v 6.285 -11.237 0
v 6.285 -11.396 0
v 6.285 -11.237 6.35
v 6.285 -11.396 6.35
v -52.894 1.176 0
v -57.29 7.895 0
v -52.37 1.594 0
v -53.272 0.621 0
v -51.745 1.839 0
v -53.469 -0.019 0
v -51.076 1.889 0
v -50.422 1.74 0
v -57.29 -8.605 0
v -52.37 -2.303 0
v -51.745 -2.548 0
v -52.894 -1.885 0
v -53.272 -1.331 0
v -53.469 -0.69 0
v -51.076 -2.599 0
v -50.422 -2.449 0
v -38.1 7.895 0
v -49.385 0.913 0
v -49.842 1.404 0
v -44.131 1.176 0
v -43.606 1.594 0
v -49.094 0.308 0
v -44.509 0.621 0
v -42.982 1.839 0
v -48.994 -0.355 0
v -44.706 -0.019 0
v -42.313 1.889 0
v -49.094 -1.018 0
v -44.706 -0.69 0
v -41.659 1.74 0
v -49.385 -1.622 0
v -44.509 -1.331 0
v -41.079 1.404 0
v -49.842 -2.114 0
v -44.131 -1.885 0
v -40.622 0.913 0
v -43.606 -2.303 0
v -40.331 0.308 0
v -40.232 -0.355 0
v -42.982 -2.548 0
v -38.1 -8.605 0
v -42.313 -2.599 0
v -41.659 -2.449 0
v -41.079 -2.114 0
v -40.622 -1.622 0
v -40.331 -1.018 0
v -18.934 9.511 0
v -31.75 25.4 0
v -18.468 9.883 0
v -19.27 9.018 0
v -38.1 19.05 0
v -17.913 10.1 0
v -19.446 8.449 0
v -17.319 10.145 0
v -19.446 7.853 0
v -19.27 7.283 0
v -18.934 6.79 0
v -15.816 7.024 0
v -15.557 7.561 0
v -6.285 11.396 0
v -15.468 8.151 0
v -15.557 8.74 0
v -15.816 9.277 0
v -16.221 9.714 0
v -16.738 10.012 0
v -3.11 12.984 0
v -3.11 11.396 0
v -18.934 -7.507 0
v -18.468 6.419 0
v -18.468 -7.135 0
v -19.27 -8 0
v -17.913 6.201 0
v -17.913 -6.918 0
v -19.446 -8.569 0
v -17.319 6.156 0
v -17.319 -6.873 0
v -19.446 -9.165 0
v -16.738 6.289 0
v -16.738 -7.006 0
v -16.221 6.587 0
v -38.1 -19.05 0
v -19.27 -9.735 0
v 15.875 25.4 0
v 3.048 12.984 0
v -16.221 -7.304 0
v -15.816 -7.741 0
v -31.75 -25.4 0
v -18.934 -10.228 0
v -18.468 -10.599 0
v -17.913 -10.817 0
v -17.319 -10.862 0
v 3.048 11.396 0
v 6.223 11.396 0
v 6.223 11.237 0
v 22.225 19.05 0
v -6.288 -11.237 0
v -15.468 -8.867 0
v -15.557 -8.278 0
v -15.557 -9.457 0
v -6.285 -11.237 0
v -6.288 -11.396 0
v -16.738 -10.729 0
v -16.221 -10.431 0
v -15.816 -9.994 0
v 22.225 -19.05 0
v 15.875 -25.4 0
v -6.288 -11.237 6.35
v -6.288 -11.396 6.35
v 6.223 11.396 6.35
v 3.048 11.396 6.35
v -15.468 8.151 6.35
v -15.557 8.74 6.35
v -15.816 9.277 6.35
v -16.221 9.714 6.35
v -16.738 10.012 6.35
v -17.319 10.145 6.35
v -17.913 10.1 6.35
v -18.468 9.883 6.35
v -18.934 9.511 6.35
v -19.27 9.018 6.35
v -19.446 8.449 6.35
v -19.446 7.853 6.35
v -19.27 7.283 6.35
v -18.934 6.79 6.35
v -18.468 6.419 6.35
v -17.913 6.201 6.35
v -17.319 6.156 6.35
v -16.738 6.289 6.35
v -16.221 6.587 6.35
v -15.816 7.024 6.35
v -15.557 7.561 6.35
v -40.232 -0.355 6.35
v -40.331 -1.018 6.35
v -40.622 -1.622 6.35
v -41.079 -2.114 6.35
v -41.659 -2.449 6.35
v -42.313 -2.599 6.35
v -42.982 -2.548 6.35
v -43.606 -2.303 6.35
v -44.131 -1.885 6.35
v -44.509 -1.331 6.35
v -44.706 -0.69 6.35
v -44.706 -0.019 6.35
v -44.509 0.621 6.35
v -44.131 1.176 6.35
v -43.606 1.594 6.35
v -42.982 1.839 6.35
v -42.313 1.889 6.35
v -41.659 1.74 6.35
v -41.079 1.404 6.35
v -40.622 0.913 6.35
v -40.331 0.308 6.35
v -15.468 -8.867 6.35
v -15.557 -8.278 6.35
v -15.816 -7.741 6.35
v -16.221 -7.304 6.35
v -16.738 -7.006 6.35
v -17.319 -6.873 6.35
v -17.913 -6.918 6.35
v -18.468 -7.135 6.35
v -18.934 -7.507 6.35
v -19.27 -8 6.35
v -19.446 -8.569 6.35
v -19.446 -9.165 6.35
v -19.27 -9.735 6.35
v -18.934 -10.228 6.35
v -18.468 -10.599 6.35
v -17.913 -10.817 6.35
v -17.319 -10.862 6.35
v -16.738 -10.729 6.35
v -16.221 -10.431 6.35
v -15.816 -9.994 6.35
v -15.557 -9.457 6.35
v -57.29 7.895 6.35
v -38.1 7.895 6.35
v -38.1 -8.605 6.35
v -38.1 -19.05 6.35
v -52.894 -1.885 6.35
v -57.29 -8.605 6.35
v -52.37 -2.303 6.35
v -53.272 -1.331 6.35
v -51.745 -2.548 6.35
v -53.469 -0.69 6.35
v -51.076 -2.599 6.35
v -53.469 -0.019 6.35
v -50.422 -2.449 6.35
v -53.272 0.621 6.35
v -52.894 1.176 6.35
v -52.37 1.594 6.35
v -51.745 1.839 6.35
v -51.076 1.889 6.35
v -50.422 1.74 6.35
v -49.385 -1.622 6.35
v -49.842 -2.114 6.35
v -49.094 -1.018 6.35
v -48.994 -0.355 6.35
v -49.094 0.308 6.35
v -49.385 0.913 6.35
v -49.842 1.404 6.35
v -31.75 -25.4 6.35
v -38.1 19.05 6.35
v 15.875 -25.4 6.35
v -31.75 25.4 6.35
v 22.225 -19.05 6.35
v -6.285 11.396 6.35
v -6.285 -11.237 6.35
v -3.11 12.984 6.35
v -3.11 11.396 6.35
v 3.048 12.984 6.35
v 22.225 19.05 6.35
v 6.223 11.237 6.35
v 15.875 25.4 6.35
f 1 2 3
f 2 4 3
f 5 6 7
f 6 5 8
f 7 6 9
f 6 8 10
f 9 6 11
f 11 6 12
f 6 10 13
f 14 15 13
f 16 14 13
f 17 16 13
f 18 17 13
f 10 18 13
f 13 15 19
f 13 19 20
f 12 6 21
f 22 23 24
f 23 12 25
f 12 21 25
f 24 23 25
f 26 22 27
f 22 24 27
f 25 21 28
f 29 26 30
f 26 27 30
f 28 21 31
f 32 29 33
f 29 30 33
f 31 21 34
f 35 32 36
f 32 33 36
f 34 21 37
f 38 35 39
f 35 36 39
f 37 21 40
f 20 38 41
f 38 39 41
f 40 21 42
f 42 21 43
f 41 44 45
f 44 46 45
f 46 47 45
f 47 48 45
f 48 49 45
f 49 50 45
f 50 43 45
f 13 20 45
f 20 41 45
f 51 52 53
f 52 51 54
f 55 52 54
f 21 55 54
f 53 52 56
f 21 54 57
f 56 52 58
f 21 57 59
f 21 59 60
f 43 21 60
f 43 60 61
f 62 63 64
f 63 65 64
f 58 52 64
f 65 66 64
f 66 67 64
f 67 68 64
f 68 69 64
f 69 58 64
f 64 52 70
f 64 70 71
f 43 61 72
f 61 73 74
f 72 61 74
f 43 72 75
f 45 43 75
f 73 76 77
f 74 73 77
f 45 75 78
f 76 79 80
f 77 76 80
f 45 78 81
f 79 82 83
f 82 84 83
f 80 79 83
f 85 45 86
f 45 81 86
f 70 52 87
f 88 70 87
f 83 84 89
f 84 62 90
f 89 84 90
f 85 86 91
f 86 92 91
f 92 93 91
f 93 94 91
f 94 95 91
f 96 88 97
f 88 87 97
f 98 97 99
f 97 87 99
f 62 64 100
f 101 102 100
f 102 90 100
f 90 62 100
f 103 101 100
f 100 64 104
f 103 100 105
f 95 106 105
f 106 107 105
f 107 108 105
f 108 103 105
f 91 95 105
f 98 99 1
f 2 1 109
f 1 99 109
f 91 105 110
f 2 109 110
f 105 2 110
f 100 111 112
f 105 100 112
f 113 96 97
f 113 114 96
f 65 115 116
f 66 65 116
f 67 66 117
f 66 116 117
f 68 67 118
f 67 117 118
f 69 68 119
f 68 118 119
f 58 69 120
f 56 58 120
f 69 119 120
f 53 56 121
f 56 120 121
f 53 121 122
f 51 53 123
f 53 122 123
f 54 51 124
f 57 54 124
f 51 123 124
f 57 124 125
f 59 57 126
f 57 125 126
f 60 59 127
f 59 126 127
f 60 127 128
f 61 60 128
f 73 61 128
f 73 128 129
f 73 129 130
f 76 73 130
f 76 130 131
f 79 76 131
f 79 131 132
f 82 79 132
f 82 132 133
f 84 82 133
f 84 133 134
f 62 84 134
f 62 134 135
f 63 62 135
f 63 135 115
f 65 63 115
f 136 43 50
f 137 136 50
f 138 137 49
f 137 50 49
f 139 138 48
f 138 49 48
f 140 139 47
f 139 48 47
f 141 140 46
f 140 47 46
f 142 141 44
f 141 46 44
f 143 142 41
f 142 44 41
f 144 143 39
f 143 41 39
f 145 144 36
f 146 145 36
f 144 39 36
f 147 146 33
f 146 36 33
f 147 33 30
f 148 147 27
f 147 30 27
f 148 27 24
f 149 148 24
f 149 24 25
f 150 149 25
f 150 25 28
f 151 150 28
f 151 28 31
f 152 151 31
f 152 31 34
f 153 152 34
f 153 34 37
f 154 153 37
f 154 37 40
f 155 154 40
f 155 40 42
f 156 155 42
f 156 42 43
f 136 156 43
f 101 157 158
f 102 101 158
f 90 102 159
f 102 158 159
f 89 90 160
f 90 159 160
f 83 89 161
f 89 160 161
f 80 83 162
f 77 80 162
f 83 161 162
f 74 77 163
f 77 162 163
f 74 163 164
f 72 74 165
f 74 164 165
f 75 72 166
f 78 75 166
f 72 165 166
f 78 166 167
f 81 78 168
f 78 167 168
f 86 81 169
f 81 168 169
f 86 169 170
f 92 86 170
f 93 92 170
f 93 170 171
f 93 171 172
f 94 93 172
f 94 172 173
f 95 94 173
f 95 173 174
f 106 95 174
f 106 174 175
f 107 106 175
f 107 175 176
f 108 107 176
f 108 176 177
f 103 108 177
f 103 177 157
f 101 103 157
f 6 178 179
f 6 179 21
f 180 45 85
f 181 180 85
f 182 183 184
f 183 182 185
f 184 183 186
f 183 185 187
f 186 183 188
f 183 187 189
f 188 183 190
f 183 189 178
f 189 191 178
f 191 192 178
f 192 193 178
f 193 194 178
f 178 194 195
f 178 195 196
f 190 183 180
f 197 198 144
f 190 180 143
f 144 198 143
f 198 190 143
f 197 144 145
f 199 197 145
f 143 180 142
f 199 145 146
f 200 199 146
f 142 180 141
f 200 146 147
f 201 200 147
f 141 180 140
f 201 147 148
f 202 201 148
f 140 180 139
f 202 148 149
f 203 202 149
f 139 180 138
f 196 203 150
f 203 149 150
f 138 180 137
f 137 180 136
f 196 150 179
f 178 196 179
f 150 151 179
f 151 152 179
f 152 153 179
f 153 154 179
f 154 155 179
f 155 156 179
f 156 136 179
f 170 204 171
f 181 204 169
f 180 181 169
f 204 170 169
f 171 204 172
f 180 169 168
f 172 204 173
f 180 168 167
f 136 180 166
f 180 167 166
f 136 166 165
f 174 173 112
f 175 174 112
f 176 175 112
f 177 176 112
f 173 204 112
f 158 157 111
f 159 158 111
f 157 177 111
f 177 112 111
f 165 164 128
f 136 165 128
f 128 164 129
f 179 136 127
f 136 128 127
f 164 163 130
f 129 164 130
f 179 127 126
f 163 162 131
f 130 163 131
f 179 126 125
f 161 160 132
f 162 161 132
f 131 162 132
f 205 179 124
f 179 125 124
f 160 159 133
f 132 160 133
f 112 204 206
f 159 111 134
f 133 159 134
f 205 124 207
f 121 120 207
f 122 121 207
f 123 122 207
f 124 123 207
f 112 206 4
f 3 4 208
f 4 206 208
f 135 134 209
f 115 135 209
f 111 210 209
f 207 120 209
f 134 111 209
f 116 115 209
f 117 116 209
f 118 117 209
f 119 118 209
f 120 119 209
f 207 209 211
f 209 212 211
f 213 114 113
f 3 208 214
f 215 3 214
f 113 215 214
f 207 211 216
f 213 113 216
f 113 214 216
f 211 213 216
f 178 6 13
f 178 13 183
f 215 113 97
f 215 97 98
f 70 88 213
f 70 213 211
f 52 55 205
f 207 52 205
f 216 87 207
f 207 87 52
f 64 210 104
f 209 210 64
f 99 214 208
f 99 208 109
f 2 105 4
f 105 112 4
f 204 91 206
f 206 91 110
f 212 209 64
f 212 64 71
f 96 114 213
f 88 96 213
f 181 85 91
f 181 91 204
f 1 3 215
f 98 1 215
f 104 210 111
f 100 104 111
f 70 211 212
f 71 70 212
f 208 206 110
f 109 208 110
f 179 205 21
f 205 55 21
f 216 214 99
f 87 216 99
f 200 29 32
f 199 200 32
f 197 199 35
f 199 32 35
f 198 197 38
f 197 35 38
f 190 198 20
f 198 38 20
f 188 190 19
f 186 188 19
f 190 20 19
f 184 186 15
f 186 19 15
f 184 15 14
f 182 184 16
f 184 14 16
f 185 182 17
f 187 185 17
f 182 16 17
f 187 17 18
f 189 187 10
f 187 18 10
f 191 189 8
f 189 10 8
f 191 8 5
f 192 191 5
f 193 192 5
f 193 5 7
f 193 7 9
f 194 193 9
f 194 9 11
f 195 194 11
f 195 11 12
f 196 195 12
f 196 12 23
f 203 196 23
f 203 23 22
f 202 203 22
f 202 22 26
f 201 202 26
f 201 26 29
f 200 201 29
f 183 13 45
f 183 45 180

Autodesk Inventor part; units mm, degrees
ref_plane "YZ Plane" through (0, 0, 0) normal (1, 0, 0) x (0, 1, 0)
ref_plane "XZ Plane" through (0, 0, 0) normal (0, 1, 0) x (-1, 0, 0)
ref_plane "XY Plane" through (0, 0, 0) normal (0, 0, 1) x (1, 0, 0)
sketch "Sketch1" plane through (0, 0, 0) normal (0, 0, 1) x (1, 0, 0)
  line L0 (-38.1, -25.4) -> (38.1, -25.4)
  line L1 (38.1, -25.4) -> (38.1, 25.4)
  line L2 (38.1, 25.4) -> (-38.1, 25.4)
  line L3 (-38.1, 25.4) -> (-38.1, -25.4)
  line L4 (-38.1, -25.4) -> (38.1, 25.4) construction
  line L5 (38.1, -25.4) -> (-38.1, 25.4) construction
  point P0 (0, 0)
  dimension "d0" = 76.2
  dimension "d1" = 50.8
extrude "Extrusion1" add sketch "Sketch1" along normal blind 6.35
sketch "Sketch3" plane through (38.1, -25.4, 0) normal (1, 0, 0) x (0, 0, -1)
  line L0 (0, 0) -> (0, 50.8) projected
  line L1 (0, 50.8) -> (-6.35, 50.8) projected
  line L2 (-6.35, 0) -> (-6.35, 50.8) projected
  line L3 (0, 0) -> (-6.35, 0) projected
  point P0 (0, 25.4)
extrude "Extrusion3" cut sketch "Sketch3" against normal blind 15.875
sketch "Sketch4" plane through (-38.1, -25.4, 0) normal (-1, 0, 0) x (0, 0, 1)
  line L0 (6.35, 16.7952) -> (0, 16.7952)
  line L1 (0, 16.7952) -> (0, 33.2952)
  line L2 (0, 33.2952) -> (6.35, 33.2952)
  line L3 (6.35, 33.2952) -> (6.35, 16.7952)
  line L4 (6.35, 16.7952) -> (0, 33.2952) construction
  line L5 (0, 16.7952) -> (6.35, 33.2952) construction
  line L6 (6.35, 50.8) -> (6.35, 0) projected
  line L7 (6.35, 50.8) -> (3.175, 50.8)
  line L8 (0, 50.8) -> (6.35, 50.8) projected
  line L9 (3.175, 50.8) -> (3.175, 25.0452)
  point P0 (0, 25.4)
  dimension "d9" = 6.35
  dimension "d10" = 16.5
extrude "Extrusion4" add sketch "Sketch4" along normal blind 3.302 contours L0 L1 L2 L3
chamfer "Chamfer1" distance 6.35 angle 45 4 edges at (-38.1, -25.4, 3.175) (-38.1, 25.4, 3.175) (22.225, -25.4, 3.175) (22.225, 25.4, 3.175)
sketch "Sketch6" plane through (0, 0, 6.35) normal (0, 0, 1) x (1, 0, 0)
  line L0 (5.9693, 11.0167) -> (6.0307, -10.9832) projected
  line L1 (-6.0307, 10.9832) -> (6.0307, 10.9832)
  line L2 (6.0307, 10.9832) -> (6.0307, -10.9832)
  line L3 (6.0307, -10.9832) -> (-6.0307, -10.9832)
  line L4 (-6.0307, -10.9832) -> (-6.0307, 10.9832)
  point P0 (0, 0)
  point P1 (5.9694, 10.9832)
extrude "Extrusion5" cut sketch "Sketch6" against normal up to surface (6.35 mm away) contours L0 L3 L4 L1
sketch "Sketch7" plane through (0, 0, 6.35) normal (0, 0, 1) x (1, 0, 0)
  circle A0 centre (-17.4683, 8.1506) radius 2 projected
  circle A1 centre (-17.4683, -8.8674) radius 2 projected
  line L0 (-8.7307, -16.3858) -> (-26.0507, -16.3858) projected
  line L1 (-8.7307, -16.3858) -> (-8.7307, 15.669) projected
  line L2 (-8.7307, 15.669) -> (-26.0507, 15.669) projected
  line L3 (-26.0507, -16.3858) -> (-26.0507, 15.669) projected
  circle A2 centre (-17.4683, 8.1506) radius 2
  circle A3 centre (-17.4683, -8.8674) radius 2
  point P0 (0, 0)
  dimension "d21" = 4
  dimension "d22" = 4
extrude "Extrusion6" cut sketch "Sketch7" against normal up to surface (6.35 mm away) contours A0 | A1
sketch "Sketch8" plane through (-41.402, -25.4, 0) normal (-1, 0, 0) x (0, 0, 1)
  line L0 (6.35, 16.7952) -> (6.35, 33.2952) projected
  line L1 (6.35, 33.2952) -> (0, 33.2952) projected
  line L2 (0, 33.2952) -> (0, 16.7952) projected
  line L3 (0, 16.7952) -> (6.35, 16.7952) projected
  line L4 (6.35, 16.7952) -> (6.35, 33.2952) projected
  line L5 (6.35, 33.2952) -> (0, 33.2952) projected
  line L6 (0, 33.2952) -> (0, 16.7952) projected
  line L7 (0, 16.7952) -> (6.35, 16.7952) projected
  point P0 (0, 25.4)
extrude "Extrusion7" add sketch "Sketch8" along normal blind 12.7
sketch "Sketch9" plane through (-38.1, -8.6048, 0) normal (0, 0, -1) x (1, 0, 0)
  line L0 (0, 0) -> (0, -16.5) projected
  line L1 (0, 0) -> (0, -8.25)
  line L2 (0, 0) -> (-16.002, 0) projected
  circle A0 centre (-4.3815, -8.25) radius 2.25
  circle A1 centre (-13.1445, -8.25) radius 2.25
  line L3 (0, -8.25) -> (-4.3815, -8.25)
  line L4 (-4.3815, -8.25) -> (-13.1445, -8.25)
  point P0 (38.1, -8.6048)
  dimension "d28" = 4.5
  dimension "d31" = 4.5
  dimension "d36" = 4.3815
  dimension "d37" = 8.763
sketch "Sketch10" plane through (-54.102, -25.4, 0) normal (-1, 0, 0) x (0, 0, 1)
  line L0 (6.35, 16.7952) -> (6.35, 33.2952) projected
  line L1 (6.35, 33.2952) -> (0, 33.2952) projected
  line L2 (0, 33.2952) -> (0, 16.7952) projected
  line L3 (0, 16.7952) -> (6.35, 16.7952) projected
  point P0 (0, 25.4)
extrude "Extrusion8" add sketch "Sketch10" along normal blind 3.1877
extrude "Extrusion9" cut sketch "Sketch9" against normal up to surface (6.35 mm away)
sketch "Sketch11" plane through (0, 0, 6.35) normal (0, 0, 1) x (1, 0, 0)
  line L0 (-6.0307, 10.9832) -> (5.9694, 10.9832) projected
  line L1 (5.9694, 10.9832) -> (6.0307, -10.9832) projected
  line L2 (-6.0307, -10.9832) -> (-6.0307, 10.9832) projected
  line L3 (6.0307, -10.9832) -> (-6.0307, -10.9832) projected
  line L4 (6.2226, 11.2372) -> (-6.2847, 11.2372)
  line L5 (-6.2847, 11.2372) -> (-6.2847, -11.2372)
  line L6 (-6.2847, -11.2372) -> (6.2854, -11.2372)
  line L7 (6.2854, -11.2372) -> (6.2226, 11.2372)
  line L8 (6.2226, 11.2372) -> (-6.2847, 11.2372)
  line L9 (-6.2847, 11.2372) -> (-6.2847, 11.396)
  line L10 (-6.2847, 11.396) -> (6.2226, 11.396)
  line L11 (6.2226, 11.396) -> (6.2226, 11.2372)
  line L12 (6.2854, -11.2372) -> (-6.2876, -11.2372)
  line L13 (-6.2876, -11.2372) -> (-6.2876, -11.396)
  line L14 (-6.2876, -11.396) -> (6.2854, -11.396)
  line L15 (6.2854, -11.396) -> (6.2854, -11.2372)
  point P0 (0, 0)
  dimension "d38" = 0.254
  dimension "d41" = 0.1588
  dimension "d42" = 12.573
  dimension "d43" = 0.1588
extrude "Extrusion10" cut sketch "Sketch11" against normal up to surface (6.35 mm away) contours L7 L6 L5 L4
sketch "Sketch12" plane through (0, 0, 6.35) normal (0, 0, 1) x (1, 0, 0)
  line L0 (6.2226, 11.2372) -> (-6.2847, 11.2372)
  line L1 (-6.2847, 11.2372) -> (-6.2847, -11.2372)
  line L2 (-6.2847, -11.2372) -> (6.2854, -11.2372)
  line L3 (6.2854, -11.2372) -> (6.2226, 11.2372)
  line L4 (6.2226, 11.2372) -> (-6.2847, 11.2372)
  line L5 (-6.2847, 11.2372) -> (-6.2847, 11.396)
  line L6 (-6.2847, 11.396) -> (6.2226, 11.396)
  line L7 (6.2226, 11.396) -> (6.2226, 11.2372)
  line L8 (6.2854, -11.2372) -> (-6.2876, -11.2372)
  line L9 (-6.2876, -11.2372) -> (-6.2876, -11.396)
  line L10 (-6.2876, -11.396) -> (6.2854, -11.396)
  line L11 (6.2854, -11.396) -> (6.2854, -11.2372)
  point P0 (0, 0)
  point P1 (-6.2847, 11.2372)
  dimension "d44" = 0.1588
  dimension "d45" = 12.573
  dimension "d46" = 0.1588
extrude "Extrusion11" cut sketch "Sketch12" against normal up to surface (6.35 mm away) contours L0 L5 L6 L7 | L11 L10 L9 L8 L2
sketch "Sketch13" plane through (0, 0, 6.35) normal (0, 0, 1) x (1, 0, 0)
  line L0 (-6.2847, 11.396) -> (-3.1097, 11.396)
  line L1 (-6.2847, 11.396) -> (6.2226, 11.396) projected
  line L2 (-6.2847, 11.396) -> (-3.1097, 11.396) construction
  line L3 (6.2226, 11.396) -> (3.0476, 11.396)
  line L4 (-3.1097, 11.396) -> (3.0476, 11.396)
  line L5 (3.0476, 11.396) -> (3.0476, 12.9835)
  line L6 (3.0476, 12.9835) -> (-3.1097, 12.9835)
  line L7 (-3.1097, 12.9835) -> (-3.1097, 11.396)
  point P0 (0, 0)
  dimension "d49" = 3.175
  dimension "d50" = 0
  dimension "d51" = 3.175
  dimension "d52" = 1.5875
extrude "Extrusion12" cut sketch "Sketch13" against normal up to surface (6.35 mm away)
properties part number "Servo Holder Module"
